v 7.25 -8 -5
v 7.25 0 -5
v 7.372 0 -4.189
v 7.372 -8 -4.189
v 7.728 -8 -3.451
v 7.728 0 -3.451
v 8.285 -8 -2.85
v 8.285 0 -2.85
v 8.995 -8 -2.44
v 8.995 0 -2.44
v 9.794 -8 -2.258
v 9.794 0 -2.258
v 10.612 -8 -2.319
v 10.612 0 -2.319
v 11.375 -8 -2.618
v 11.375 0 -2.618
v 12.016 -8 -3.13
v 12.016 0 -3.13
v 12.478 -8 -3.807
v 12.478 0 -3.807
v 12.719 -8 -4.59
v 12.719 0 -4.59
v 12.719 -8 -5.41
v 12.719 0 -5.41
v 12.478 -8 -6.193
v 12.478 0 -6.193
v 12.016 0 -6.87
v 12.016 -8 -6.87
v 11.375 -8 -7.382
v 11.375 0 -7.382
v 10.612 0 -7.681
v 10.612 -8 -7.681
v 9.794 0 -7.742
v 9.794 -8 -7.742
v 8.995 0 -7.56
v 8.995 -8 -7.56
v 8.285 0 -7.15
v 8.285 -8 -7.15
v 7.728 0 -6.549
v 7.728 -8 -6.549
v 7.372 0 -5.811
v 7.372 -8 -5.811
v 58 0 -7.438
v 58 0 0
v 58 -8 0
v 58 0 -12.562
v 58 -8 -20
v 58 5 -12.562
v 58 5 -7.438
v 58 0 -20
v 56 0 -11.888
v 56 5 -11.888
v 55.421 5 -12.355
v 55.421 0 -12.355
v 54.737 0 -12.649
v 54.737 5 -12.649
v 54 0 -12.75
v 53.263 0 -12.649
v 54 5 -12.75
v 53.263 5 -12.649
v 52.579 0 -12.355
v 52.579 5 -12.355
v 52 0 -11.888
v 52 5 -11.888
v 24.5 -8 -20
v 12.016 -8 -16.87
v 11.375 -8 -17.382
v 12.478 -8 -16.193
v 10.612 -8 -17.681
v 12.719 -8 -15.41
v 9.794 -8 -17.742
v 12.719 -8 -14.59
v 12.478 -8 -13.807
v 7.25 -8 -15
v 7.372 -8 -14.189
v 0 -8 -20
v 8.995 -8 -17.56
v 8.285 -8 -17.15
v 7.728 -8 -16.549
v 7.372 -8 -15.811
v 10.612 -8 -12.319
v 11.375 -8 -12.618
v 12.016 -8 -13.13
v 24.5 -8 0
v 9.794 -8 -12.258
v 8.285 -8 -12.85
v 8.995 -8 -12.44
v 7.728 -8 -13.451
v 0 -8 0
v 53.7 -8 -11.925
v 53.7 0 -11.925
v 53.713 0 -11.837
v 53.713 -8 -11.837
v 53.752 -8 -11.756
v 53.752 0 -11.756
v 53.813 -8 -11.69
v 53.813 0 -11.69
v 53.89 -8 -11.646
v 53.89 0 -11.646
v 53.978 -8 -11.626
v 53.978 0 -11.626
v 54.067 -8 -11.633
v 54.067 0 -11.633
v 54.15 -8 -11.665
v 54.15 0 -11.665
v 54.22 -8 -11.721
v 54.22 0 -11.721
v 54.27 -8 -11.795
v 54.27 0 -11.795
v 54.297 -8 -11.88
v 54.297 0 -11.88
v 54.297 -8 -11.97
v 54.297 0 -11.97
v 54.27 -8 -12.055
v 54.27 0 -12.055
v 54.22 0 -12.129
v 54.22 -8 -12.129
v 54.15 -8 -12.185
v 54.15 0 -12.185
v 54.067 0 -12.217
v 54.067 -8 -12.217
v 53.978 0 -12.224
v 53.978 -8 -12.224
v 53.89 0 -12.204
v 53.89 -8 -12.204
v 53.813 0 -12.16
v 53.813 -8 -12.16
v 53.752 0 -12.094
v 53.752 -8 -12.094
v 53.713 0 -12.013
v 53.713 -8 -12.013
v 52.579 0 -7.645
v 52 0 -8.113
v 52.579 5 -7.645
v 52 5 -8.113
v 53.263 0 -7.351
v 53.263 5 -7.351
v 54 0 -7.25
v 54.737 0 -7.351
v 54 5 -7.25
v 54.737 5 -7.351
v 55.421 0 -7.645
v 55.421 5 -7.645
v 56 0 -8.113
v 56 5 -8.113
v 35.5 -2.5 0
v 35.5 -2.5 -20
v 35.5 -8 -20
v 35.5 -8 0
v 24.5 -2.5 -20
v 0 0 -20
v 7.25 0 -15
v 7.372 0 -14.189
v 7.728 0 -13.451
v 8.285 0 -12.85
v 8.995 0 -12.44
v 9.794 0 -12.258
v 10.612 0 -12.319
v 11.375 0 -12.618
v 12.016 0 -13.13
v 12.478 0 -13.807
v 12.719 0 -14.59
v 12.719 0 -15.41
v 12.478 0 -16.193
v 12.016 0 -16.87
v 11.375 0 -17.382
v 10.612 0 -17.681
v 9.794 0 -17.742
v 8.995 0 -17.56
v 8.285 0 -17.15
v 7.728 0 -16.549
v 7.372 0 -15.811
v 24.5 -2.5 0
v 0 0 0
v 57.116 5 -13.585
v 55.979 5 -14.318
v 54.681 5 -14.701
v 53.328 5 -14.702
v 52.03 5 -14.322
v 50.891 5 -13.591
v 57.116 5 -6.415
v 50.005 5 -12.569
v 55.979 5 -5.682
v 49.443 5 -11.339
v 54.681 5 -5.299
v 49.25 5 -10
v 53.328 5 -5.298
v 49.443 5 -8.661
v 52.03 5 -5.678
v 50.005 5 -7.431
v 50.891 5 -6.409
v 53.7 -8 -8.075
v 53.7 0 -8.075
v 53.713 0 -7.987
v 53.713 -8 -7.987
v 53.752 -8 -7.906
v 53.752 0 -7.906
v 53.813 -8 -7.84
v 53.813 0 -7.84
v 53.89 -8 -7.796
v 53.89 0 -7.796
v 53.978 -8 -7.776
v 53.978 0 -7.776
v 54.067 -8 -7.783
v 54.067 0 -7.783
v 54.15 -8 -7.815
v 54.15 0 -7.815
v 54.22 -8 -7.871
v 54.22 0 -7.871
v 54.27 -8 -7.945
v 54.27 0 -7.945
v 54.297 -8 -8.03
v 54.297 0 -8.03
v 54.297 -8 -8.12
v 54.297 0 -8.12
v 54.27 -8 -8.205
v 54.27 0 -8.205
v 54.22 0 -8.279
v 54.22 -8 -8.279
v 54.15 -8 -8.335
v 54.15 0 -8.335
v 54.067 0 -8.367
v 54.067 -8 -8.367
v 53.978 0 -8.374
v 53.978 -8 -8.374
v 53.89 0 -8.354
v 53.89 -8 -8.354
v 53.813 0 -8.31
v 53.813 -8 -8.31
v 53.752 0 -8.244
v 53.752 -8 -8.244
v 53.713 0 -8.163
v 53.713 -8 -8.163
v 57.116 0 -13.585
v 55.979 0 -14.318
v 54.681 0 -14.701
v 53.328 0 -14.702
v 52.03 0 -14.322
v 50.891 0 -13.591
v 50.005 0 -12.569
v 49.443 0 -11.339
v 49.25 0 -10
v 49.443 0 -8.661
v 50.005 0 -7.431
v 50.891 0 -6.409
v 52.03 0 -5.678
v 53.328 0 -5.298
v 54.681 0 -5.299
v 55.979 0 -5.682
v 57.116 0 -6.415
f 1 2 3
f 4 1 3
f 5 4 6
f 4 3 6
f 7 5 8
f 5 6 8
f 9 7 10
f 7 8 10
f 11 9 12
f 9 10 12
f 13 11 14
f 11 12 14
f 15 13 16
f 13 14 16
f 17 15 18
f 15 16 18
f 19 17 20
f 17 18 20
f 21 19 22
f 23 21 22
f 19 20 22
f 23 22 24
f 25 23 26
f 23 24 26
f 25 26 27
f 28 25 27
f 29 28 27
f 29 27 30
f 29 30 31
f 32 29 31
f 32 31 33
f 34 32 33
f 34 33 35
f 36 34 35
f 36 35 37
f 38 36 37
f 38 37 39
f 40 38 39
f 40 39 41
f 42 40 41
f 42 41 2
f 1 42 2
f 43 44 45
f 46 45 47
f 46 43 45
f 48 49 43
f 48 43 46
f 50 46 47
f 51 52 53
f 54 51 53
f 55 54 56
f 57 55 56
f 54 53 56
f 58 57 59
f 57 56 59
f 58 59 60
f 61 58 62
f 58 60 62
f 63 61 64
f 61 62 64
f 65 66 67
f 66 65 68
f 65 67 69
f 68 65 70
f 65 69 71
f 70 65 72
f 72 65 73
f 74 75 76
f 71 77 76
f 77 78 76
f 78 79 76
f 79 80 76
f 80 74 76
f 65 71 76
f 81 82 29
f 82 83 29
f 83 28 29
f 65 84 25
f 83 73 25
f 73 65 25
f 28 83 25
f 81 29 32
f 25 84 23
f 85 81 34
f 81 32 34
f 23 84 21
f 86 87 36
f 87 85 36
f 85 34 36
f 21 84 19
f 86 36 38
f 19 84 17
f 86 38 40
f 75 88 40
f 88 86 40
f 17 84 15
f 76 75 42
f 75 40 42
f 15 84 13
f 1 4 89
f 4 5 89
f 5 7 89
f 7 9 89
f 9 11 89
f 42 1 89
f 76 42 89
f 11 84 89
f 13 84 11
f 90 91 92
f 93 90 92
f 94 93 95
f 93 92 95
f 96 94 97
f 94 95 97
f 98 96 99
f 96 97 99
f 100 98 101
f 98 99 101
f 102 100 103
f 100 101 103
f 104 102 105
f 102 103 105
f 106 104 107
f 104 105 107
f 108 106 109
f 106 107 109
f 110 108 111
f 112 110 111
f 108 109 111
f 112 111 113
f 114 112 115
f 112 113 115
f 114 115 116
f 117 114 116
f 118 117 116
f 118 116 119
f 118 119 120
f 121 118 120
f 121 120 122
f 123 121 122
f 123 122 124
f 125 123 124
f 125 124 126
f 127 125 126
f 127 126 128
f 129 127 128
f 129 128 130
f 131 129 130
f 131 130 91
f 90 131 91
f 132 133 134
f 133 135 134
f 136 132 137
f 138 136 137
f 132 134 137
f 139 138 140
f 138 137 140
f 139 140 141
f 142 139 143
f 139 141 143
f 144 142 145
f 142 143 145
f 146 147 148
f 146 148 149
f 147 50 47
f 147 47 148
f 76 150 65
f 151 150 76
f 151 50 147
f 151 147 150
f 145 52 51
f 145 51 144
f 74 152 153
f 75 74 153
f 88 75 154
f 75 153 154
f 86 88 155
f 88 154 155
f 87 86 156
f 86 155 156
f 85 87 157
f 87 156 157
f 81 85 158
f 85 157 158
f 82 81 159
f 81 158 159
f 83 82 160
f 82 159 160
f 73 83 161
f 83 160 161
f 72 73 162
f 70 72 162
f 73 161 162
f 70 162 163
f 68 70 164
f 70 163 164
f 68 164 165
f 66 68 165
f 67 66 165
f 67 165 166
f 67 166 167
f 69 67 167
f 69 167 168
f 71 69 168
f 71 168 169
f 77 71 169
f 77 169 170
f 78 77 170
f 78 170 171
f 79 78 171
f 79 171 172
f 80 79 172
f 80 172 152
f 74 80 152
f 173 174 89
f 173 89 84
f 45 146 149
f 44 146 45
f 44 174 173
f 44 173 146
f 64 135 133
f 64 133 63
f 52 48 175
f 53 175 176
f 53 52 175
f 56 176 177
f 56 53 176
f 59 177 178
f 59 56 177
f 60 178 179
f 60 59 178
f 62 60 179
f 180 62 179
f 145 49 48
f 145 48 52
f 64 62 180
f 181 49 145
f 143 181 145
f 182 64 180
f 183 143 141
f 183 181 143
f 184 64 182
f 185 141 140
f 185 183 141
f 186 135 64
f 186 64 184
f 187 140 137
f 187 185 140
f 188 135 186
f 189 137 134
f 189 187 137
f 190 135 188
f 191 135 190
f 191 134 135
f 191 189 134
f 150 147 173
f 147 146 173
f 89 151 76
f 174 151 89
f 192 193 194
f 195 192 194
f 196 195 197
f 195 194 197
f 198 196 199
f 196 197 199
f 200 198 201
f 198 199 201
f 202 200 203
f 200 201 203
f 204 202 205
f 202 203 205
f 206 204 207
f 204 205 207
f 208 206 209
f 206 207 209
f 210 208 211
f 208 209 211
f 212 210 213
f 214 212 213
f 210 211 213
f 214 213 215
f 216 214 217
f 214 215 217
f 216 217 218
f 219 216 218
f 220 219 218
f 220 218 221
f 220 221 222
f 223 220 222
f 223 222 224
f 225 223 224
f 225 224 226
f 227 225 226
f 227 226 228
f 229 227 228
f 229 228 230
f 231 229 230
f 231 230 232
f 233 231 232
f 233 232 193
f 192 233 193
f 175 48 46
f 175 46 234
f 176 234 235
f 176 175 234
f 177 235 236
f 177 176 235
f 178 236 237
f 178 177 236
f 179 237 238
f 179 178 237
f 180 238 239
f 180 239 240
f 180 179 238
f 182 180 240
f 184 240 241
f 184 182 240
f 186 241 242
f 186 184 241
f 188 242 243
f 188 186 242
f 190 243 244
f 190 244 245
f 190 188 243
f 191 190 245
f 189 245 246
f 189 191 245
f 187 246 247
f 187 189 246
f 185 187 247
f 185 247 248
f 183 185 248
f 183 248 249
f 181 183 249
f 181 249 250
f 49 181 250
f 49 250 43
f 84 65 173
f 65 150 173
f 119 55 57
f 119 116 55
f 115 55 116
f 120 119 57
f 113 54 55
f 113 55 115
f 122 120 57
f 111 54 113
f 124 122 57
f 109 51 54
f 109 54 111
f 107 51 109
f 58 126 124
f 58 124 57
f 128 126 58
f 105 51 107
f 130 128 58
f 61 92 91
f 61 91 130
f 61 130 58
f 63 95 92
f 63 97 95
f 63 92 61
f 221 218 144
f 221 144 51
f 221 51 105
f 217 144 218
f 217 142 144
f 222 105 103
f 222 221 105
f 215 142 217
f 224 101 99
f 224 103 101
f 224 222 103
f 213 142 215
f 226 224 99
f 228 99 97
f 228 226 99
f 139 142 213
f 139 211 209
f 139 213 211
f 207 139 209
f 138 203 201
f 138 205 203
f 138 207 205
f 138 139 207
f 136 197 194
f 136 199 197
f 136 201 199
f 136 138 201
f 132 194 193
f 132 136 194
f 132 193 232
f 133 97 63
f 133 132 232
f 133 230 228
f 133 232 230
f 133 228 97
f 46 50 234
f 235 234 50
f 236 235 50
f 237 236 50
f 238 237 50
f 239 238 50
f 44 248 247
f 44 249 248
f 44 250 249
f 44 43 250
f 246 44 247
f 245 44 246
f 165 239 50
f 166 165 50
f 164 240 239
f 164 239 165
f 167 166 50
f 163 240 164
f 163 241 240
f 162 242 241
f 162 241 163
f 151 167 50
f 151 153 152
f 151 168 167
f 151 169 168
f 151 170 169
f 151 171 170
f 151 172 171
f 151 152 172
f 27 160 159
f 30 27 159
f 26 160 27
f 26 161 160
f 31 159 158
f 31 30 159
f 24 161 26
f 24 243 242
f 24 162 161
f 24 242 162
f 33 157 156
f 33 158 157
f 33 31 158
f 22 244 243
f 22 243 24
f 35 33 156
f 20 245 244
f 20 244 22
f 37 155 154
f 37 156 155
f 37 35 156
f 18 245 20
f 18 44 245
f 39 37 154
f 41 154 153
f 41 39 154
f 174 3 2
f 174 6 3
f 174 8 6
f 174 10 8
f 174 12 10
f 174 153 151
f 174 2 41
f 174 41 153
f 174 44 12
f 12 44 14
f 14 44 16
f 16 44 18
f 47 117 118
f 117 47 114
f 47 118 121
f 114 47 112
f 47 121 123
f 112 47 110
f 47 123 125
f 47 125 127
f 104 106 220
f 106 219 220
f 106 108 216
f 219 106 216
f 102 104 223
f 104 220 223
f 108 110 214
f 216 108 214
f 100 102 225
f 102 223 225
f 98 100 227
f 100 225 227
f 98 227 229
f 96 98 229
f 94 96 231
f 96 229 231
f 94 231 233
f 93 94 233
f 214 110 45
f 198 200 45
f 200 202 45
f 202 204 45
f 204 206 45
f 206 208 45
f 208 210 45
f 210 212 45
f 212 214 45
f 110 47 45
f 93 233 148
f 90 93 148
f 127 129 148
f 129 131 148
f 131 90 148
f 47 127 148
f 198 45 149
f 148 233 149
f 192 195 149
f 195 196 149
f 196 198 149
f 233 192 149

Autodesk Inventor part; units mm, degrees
ref_plane "YZ Plane" through (0, 0, 0) normal (1, 0, 0) x (0, 1, 0)
ref_plane "XZ Plane" through (0, 0, 0) normal (0, 1, 0) x (-1, 0, 0)
ref_plane "XY Plane" through (0, 0, 0) normal (0, 0, 1) x (1, 0, 0)
sketch "Sketch1" plane through (0, 0, 0) normal (0, 1, 0) x (-1, 0, 0)
  line L0 (0, 0) -> (-58, 0)
  line L1 (-58, 0) -> (-58, -20)
  line L2 (-58, -20) -> (0, -20)
  line L3 (0, -20) -> (0, 0)
  line L4 (-58, -10) -> (-54, -10) construction
  arc A0 (-56, -11.8875) -> (-52, -11.8875) centre (-54, -10) ccw
  line L5 (-58, -10) -> (-56, -10) construction
  line L6 (-56, -10) -> (-56, -11.8875)
  line L7 (-56, -10) -> (-56, -8.1125)
  line L8 (-54, -10) -> (-52, -10) construction
  line L9 (-52, -10) -> (-52, -11.8875)
  line L10 (-52, -10) -> (-52, -8.1125)
  arc A1 (-52, -8.1125) -> (-56, -8.1125) centre (-54, -10) ccw
  arc A2 (-58, -12.5617) -> (-58, -7.4383) centre (-54, -10) ccw
  line L11 (0, 0) -> (-10, 0) construction
  line L12 (-10, 0) -> (-10, -5) construction
  line L13 (-10, -20) -> (-10, -15) construction
  circle A3 centre (-10, -5) radius 2.75
  circle A4 centre (-10, -15) radius 2.75
  line L14 (-54, -10) -> (-54, -11.925) construction
  line L15 (-54, -10) -> (-54, -8.075) construction
  circle A5 centre (-54, -8.075) radius 0.3
  circle A6 centre (-54, -11.925) radius 0.3
  line L16 (-58, -10) -> (-31.5, -10) construction
  line L17 (-33.5, -10) -> (-24.5, -10) construction
  line L18 (-35.5, -20) -> (-35.5, 0)
  line L19 (-24.5, -20) -> (-24.5, 0)
  line L20 (-31.5, -10) -> (-33.5, -10) construction
  line L21 (-33.5, -10) -> (-35.5, -10) construction
  line L22 (-24.5, 0) -> (-35.5, 0)
  line L23 (-35.5, 0) -> (-35.5, -20)
  line L24 (-35.5, -20) -> (-24.5, -20)
  line L25 (-24.5, -20) -> (-24.5, 0)
  dimension "d0" = 58
  dimension "d1" = 20
  dimension "d2" = 4
  dimension "d4" = 2
  dimension "d5" = 2
  dimension "d7" = 10
  dimension "d8" = 5
  dimension "d9" = 5
  dimension "d10" = 5.5
  dimension "d11" = 5.5
  dimension "d18" = 1.925
  dimension "d19" = 1.925
  dimension "d20" = 0.6
  dimension "d21" = 0.6
  dimension "d24" = 26.5
  dimension "d25" = 9
  dimension "d32" = 2
  dimension "d33" = 2
extrude "Extrusion2" add sketch "Sketch1" against normal blind 8 contours A2 L1
extrude "Extrusion3" add sketch "Sketch1" along normal blind 5 contours A2 L1
extrude "Extrusion4" add sketch "Sketch1" against normal blind 8 contours L6 L7 A1 L10 L9 A0
extrude "Extrusion8" add sketch "Sketch1" against normal blind 8 contours L3 L2 L19 L0 | L18 L2 L1 A2 L0
extrude "Extrusion9" add sketch "Sketch1" against normal blind 2.5 contours L19 L2 L18 L0
properties part number "LDR_Holder"
